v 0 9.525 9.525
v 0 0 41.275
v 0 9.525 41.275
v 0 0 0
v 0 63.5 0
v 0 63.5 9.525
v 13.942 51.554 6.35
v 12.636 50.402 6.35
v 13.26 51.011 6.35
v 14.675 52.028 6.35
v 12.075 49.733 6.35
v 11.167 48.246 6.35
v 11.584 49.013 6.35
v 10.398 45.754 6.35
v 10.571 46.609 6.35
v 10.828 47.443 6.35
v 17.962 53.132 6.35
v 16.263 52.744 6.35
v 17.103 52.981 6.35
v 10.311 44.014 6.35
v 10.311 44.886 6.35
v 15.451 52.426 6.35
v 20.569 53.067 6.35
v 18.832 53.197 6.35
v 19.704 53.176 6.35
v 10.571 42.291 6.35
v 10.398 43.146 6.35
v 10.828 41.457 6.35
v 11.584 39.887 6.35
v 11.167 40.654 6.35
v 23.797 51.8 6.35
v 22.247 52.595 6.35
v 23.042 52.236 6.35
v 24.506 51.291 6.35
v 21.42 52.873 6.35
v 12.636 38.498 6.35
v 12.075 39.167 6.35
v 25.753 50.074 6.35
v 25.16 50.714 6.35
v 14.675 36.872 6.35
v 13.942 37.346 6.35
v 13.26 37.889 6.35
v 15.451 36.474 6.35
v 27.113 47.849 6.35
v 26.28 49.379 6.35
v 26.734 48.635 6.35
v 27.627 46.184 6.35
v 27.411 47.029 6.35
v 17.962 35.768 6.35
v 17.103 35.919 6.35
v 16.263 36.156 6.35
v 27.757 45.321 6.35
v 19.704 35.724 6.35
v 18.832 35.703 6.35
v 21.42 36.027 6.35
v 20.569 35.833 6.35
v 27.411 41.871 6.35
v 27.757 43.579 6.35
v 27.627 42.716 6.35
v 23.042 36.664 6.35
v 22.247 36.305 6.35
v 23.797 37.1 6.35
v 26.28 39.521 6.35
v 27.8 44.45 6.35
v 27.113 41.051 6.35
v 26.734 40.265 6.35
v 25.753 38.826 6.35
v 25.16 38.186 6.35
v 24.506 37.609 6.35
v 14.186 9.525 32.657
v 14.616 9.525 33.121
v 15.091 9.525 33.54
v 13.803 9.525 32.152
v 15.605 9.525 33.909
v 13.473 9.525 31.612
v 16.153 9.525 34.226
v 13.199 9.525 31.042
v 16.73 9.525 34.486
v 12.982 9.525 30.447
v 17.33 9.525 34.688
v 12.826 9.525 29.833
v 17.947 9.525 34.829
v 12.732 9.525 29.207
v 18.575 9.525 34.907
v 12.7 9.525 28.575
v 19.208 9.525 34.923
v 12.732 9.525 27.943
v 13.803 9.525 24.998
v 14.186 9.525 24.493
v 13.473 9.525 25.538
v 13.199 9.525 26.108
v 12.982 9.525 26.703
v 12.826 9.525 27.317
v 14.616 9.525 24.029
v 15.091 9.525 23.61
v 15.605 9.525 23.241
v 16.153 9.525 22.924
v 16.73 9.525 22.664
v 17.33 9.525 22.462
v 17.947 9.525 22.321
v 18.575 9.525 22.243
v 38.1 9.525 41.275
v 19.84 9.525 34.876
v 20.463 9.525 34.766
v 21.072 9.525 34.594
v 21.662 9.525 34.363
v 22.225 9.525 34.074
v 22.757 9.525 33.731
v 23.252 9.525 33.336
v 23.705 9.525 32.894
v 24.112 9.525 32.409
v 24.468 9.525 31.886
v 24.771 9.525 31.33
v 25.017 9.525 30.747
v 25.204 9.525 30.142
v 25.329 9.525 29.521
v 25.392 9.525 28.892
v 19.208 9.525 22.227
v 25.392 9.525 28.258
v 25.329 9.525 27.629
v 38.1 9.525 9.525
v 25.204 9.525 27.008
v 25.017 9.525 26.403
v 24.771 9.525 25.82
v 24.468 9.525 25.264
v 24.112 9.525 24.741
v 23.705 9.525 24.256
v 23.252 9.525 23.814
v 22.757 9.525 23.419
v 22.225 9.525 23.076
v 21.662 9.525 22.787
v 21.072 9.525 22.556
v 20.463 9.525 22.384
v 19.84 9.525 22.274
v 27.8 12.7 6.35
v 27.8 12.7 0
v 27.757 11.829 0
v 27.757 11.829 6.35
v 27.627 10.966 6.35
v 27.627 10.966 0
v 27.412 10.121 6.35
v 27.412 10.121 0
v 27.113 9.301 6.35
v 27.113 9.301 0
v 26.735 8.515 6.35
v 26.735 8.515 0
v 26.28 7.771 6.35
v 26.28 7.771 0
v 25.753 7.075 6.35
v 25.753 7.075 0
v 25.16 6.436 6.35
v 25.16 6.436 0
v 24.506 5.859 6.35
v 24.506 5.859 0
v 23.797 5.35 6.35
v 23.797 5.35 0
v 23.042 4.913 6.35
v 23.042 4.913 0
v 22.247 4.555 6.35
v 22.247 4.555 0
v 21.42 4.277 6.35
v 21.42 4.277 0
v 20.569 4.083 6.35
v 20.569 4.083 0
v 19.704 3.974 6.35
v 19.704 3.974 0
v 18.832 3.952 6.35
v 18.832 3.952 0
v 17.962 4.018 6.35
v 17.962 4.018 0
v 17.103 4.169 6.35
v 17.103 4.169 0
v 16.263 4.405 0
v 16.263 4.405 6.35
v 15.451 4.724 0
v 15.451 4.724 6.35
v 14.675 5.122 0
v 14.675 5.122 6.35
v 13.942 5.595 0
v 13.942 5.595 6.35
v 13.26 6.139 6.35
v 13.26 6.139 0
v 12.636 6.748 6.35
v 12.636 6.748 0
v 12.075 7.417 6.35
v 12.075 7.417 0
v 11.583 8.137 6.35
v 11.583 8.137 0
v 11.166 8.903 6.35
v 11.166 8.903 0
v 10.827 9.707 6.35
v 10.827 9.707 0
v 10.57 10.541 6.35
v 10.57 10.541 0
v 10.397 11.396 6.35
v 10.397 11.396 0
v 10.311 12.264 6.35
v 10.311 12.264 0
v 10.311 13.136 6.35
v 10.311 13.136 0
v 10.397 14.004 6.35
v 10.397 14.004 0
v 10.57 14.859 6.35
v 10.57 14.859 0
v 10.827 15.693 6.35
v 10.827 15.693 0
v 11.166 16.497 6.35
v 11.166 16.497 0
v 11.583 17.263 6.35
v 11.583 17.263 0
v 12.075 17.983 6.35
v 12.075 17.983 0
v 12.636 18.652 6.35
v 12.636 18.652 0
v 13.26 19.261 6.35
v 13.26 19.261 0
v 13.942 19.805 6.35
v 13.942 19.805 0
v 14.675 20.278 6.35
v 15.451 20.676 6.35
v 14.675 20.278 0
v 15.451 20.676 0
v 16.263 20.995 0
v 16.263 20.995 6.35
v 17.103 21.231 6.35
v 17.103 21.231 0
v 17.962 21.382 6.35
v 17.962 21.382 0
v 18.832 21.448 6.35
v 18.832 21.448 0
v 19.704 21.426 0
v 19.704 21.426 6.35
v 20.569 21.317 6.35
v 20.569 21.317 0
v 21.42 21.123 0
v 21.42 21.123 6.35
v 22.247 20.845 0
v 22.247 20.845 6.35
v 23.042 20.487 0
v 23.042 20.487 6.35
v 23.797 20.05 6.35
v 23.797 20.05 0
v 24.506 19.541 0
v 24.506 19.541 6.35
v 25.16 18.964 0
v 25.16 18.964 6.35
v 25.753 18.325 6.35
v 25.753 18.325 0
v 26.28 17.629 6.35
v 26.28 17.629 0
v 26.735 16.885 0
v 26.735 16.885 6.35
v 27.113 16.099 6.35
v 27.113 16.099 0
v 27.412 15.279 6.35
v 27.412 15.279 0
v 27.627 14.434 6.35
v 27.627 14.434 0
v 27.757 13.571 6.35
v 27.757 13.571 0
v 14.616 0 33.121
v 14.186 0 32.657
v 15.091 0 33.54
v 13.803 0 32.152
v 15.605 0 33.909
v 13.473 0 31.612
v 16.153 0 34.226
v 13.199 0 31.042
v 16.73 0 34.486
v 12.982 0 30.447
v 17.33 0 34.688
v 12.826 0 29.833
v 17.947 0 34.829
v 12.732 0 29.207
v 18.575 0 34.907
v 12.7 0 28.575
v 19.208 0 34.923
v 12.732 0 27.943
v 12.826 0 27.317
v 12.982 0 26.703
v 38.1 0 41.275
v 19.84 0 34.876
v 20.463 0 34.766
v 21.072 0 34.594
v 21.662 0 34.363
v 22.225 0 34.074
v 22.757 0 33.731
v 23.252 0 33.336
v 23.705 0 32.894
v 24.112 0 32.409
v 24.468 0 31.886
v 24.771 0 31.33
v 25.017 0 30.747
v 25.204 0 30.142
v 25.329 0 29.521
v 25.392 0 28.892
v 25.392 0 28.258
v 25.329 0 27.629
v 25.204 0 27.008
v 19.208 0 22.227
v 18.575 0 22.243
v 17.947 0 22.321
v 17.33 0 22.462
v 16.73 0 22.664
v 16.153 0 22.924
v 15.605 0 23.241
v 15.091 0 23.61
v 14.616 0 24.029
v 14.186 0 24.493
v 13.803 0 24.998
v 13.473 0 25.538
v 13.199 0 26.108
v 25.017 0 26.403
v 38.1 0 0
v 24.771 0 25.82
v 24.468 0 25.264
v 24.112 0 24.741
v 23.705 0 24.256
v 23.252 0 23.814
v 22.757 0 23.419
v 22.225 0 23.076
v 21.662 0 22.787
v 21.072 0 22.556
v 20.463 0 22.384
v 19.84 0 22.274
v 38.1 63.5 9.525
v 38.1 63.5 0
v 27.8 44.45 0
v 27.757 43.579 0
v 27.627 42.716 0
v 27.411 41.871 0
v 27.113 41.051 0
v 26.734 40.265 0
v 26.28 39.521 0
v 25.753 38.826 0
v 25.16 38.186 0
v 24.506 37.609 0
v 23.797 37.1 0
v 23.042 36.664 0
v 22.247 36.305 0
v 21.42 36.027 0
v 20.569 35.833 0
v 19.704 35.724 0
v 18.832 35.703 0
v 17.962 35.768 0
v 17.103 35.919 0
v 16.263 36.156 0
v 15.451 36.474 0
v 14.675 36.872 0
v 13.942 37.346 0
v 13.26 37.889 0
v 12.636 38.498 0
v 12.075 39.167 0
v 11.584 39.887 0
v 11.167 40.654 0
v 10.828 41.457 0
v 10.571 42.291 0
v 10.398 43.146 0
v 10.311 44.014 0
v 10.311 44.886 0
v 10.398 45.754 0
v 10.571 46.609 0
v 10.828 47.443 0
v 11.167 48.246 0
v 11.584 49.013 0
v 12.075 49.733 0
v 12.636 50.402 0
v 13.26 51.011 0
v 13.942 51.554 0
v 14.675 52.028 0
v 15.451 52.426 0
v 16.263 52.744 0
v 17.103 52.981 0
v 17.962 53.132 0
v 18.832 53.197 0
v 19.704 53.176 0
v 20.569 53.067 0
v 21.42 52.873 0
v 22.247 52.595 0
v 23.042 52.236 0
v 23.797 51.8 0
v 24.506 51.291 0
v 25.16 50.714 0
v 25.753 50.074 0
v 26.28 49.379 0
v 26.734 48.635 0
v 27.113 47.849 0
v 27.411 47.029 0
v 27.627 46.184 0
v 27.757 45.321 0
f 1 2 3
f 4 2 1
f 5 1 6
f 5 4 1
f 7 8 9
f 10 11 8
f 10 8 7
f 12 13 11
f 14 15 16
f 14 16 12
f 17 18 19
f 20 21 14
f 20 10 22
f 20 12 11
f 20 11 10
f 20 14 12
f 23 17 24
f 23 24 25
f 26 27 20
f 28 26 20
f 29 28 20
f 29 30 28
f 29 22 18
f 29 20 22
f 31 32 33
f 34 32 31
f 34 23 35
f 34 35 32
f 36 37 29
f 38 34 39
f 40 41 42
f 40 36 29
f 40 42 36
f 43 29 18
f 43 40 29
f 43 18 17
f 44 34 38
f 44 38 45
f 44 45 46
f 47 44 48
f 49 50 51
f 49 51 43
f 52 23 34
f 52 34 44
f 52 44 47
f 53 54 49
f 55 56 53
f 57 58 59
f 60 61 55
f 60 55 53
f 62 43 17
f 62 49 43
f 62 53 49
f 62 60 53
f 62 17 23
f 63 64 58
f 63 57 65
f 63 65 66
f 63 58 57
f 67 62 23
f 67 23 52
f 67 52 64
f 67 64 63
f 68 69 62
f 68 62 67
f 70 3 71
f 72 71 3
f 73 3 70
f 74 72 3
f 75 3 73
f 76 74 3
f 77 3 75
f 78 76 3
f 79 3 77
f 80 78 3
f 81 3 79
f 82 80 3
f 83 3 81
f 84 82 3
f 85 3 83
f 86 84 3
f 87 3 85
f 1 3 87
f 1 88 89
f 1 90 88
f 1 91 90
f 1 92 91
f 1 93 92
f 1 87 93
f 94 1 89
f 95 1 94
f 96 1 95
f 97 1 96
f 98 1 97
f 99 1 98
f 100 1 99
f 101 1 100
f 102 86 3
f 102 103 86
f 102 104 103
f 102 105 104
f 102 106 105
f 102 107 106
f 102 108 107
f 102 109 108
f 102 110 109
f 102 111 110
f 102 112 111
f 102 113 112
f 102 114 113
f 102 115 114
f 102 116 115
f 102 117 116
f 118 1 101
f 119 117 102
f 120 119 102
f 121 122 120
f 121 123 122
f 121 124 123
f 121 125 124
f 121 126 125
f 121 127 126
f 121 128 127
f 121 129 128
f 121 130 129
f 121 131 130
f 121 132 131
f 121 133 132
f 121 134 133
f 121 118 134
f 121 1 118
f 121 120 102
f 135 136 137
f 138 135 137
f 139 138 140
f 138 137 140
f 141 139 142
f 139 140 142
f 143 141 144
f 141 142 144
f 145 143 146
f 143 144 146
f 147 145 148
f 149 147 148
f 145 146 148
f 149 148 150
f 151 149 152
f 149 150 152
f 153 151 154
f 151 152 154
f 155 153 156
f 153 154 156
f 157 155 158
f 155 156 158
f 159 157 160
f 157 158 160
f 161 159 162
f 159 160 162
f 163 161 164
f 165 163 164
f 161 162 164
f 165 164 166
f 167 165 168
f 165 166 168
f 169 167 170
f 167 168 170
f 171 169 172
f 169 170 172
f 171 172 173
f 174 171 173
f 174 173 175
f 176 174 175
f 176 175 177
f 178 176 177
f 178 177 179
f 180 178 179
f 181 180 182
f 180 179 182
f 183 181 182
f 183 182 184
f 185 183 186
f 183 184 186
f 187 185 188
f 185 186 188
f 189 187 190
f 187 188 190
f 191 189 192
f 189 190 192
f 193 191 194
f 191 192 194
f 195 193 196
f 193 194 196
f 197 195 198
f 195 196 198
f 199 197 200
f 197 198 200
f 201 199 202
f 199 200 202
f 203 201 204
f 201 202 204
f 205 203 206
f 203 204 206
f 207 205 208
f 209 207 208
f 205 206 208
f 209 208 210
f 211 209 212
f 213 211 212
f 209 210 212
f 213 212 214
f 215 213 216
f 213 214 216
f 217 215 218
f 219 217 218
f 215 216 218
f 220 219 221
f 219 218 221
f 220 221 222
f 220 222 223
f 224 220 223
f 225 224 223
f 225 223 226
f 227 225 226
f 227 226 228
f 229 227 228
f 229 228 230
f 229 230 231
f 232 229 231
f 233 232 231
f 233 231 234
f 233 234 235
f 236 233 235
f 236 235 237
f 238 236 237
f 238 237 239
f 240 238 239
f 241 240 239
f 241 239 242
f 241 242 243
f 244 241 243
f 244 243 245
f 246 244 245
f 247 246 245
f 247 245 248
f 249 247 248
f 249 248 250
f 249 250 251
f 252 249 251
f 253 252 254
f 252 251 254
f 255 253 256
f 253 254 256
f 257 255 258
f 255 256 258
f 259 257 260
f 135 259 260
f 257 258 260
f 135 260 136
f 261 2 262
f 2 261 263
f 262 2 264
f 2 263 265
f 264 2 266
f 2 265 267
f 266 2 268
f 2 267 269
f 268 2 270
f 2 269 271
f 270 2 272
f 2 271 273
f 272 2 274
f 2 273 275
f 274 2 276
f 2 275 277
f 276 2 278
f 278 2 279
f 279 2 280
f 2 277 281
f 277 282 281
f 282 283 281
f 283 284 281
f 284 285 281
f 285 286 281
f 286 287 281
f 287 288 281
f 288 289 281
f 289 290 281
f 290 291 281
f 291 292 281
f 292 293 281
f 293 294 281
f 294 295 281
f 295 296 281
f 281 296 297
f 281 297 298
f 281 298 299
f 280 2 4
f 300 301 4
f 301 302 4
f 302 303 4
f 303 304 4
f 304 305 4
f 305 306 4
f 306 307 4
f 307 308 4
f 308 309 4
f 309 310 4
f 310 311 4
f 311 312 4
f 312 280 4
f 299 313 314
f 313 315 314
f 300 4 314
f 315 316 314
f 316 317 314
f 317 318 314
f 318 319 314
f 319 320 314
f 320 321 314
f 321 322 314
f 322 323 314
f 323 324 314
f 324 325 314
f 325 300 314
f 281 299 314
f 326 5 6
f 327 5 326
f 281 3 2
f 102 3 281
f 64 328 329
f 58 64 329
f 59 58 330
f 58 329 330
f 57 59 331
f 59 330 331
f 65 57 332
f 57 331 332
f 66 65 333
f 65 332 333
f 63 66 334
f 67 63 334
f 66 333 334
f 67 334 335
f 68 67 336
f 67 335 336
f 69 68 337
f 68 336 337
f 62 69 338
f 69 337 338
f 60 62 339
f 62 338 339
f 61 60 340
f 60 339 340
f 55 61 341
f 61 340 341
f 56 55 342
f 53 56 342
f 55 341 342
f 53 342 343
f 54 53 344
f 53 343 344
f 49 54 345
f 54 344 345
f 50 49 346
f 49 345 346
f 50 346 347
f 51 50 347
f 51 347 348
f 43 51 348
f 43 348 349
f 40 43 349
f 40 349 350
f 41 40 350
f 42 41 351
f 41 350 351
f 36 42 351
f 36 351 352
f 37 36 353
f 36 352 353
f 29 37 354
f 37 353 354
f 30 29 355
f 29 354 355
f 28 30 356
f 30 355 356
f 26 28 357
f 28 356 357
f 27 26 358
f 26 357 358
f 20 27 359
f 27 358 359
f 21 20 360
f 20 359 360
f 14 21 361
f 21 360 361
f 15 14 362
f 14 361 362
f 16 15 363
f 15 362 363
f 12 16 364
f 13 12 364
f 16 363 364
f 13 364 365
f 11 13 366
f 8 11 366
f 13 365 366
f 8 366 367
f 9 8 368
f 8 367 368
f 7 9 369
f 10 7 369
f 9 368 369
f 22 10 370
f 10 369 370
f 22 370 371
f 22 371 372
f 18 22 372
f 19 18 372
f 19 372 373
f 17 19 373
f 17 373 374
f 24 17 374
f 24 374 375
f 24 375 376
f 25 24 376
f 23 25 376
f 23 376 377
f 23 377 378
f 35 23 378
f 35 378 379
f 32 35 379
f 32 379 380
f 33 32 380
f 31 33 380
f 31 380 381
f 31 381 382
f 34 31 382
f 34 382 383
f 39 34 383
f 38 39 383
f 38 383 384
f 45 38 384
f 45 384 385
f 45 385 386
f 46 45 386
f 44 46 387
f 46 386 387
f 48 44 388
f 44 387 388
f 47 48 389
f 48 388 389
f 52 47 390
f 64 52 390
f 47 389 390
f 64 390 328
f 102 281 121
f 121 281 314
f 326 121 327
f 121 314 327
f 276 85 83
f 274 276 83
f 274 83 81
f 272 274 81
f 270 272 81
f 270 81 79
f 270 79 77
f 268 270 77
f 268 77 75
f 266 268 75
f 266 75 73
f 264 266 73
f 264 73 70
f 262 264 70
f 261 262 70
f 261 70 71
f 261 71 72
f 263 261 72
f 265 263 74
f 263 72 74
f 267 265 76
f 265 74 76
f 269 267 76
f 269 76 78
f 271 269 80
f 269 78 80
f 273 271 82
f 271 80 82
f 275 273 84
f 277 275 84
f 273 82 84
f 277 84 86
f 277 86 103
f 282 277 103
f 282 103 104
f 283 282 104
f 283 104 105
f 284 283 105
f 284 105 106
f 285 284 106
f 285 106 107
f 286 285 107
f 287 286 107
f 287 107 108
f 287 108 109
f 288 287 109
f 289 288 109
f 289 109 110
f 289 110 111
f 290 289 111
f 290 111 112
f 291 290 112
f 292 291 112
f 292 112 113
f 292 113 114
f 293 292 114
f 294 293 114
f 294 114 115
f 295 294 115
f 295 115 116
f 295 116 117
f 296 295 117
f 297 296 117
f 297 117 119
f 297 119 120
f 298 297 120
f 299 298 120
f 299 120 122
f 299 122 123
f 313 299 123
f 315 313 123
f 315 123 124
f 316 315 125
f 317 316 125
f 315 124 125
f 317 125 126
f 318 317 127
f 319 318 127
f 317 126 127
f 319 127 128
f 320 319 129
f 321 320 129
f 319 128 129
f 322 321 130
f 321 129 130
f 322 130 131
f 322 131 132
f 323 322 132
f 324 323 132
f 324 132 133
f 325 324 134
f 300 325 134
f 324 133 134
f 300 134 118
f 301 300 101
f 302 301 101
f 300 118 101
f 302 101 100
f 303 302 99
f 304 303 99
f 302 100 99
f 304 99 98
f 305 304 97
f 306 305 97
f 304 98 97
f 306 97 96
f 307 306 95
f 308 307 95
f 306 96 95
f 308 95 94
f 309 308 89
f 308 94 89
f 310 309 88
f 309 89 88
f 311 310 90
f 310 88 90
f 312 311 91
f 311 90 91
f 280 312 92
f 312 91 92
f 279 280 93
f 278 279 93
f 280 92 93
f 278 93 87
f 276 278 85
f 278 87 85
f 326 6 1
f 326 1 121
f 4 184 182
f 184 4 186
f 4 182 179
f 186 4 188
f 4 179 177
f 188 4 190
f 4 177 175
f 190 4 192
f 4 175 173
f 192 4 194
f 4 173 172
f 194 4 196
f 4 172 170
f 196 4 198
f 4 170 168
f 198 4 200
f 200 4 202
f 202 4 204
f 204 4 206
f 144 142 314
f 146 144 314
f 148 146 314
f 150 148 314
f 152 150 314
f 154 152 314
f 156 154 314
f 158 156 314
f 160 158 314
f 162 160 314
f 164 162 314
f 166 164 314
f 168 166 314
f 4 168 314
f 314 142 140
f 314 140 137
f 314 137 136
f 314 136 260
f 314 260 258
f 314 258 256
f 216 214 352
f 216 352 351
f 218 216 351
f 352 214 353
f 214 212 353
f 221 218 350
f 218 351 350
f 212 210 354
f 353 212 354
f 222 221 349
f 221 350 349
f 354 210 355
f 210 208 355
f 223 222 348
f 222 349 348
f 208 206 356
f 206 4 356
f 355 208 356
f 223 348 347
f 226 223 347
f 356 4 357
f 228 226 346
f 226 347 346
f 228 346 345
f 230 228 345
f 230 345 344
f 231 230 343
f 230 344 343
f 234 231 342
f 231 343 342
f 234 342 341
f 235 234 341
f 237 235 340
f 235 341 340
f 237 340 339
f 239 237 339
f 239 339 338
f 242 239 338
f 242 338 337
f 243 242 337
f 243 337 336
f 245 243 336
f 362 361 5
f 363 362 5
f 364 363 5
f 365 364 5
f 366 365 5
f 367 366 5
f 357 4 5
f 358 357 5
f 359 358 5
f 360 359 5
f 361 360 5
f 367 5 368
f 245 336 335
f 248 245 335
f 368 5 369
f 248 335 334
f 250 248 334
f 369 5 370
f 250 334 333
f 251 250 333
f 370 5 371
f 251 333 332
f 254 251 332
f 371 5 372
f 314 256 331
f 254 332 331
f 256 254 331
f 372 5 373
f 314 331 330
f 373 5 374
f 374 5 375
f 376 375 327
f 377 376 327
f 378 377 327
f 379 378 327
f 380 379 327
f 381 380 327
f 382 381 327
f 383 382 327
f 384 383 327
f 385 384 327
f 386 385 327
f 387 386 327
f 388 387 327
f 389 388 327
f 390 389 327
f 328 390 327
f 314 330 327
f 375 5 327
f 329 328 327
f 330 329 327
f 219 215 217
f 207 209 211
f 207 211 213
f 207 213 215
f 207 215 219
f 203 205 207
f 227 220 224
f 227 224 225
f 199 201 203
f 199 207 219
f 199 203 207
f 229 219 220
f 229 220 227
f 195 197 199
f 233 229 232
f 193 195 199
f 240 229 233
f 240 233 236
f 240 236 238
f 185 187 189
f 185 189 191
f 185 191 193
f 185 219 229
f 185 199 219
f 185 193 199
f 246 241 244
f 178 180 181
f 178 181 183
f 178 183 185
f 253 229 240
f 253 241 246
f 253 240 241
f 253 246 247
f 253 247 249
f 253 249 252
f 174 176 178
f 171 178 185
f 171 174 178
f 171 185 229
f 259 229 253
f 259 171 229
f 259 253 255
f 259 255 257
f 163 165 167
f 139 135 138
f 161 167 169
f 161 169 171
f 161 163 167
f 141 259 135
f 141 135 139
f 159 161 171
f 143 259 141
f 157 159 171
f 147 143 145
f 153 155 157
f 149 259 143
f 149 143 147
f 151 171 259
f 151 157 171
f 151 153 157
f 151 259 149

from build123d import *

# Parameters (mm, degrees)
F0_W     = 38.1
F0_H     = 63.5
F1_DEPTH = 9.525
F2_W     = 38.1
F2_H     = 9.525
F3_DEPTH = 31.75
F4_R     = 8.75
F5_DEPTH = 6.35
F6_R     = 6.35
F7_DEPTH = 25.4
F4_R_2   = 8.7503
F8_DEPTH = 6.35


with BuildPart() as f1:
    # F0 (on Top) → F1 (new body)
    with BuildSketch(Plane.XY):
        with Locations((19.05, 31.75)):
            Rectangle(F0_W, F0_H)
    extrude(amount=F1_DEPTH)

    # F2 (on face) → F3 (join)
    with BuildSketch(Plane.XY.offset(9.525)):
        with Locations((19.05, 4.7625)):
            Rectangle(F2_W, F2_H)
    extrude(amount=F3_DEPTH)

    # F4 (on face) → F5 (cut)
    with BuildSketch(Plane(origin=(0, 0, 0), x_dir=(1, 0, 0), z_dir=(0, 0, -1))):
        with Locations((19.05, -44.45)):
            Circle(F4_R)
    extrude(amount=-F5_DEPTH, mode=Mode.SUBTRACT)

    # F6 (on face) → F7 (cut)
    with BuildSketch(Plane(origin=(0, 9.525, 0), x_dir=(-1, 0, 0), z_dir=(0, 1, 0))):
        with Locations((-19.05, 28.575)):
            Circle(F6_R)
    extrude(amount=-F7_DEPTH, mode=Mode.SUBTRACT)

    # F4 (on face) → F8 (cut)
    with BuildSketch(Plane(origin=(0, 0, 0), x_dir=(1, 0, 0), z_dir=(0, 0, -1))):
        with Locations((19.05, -44.45)):
            Circle(F4_R)
        with Locations((19.05, -12.7)):
            Circle(F4_R_2)
    extrude(amount=-F8_DEPTH, mode=Mode.SUBTRACT)


solid = f1.part
